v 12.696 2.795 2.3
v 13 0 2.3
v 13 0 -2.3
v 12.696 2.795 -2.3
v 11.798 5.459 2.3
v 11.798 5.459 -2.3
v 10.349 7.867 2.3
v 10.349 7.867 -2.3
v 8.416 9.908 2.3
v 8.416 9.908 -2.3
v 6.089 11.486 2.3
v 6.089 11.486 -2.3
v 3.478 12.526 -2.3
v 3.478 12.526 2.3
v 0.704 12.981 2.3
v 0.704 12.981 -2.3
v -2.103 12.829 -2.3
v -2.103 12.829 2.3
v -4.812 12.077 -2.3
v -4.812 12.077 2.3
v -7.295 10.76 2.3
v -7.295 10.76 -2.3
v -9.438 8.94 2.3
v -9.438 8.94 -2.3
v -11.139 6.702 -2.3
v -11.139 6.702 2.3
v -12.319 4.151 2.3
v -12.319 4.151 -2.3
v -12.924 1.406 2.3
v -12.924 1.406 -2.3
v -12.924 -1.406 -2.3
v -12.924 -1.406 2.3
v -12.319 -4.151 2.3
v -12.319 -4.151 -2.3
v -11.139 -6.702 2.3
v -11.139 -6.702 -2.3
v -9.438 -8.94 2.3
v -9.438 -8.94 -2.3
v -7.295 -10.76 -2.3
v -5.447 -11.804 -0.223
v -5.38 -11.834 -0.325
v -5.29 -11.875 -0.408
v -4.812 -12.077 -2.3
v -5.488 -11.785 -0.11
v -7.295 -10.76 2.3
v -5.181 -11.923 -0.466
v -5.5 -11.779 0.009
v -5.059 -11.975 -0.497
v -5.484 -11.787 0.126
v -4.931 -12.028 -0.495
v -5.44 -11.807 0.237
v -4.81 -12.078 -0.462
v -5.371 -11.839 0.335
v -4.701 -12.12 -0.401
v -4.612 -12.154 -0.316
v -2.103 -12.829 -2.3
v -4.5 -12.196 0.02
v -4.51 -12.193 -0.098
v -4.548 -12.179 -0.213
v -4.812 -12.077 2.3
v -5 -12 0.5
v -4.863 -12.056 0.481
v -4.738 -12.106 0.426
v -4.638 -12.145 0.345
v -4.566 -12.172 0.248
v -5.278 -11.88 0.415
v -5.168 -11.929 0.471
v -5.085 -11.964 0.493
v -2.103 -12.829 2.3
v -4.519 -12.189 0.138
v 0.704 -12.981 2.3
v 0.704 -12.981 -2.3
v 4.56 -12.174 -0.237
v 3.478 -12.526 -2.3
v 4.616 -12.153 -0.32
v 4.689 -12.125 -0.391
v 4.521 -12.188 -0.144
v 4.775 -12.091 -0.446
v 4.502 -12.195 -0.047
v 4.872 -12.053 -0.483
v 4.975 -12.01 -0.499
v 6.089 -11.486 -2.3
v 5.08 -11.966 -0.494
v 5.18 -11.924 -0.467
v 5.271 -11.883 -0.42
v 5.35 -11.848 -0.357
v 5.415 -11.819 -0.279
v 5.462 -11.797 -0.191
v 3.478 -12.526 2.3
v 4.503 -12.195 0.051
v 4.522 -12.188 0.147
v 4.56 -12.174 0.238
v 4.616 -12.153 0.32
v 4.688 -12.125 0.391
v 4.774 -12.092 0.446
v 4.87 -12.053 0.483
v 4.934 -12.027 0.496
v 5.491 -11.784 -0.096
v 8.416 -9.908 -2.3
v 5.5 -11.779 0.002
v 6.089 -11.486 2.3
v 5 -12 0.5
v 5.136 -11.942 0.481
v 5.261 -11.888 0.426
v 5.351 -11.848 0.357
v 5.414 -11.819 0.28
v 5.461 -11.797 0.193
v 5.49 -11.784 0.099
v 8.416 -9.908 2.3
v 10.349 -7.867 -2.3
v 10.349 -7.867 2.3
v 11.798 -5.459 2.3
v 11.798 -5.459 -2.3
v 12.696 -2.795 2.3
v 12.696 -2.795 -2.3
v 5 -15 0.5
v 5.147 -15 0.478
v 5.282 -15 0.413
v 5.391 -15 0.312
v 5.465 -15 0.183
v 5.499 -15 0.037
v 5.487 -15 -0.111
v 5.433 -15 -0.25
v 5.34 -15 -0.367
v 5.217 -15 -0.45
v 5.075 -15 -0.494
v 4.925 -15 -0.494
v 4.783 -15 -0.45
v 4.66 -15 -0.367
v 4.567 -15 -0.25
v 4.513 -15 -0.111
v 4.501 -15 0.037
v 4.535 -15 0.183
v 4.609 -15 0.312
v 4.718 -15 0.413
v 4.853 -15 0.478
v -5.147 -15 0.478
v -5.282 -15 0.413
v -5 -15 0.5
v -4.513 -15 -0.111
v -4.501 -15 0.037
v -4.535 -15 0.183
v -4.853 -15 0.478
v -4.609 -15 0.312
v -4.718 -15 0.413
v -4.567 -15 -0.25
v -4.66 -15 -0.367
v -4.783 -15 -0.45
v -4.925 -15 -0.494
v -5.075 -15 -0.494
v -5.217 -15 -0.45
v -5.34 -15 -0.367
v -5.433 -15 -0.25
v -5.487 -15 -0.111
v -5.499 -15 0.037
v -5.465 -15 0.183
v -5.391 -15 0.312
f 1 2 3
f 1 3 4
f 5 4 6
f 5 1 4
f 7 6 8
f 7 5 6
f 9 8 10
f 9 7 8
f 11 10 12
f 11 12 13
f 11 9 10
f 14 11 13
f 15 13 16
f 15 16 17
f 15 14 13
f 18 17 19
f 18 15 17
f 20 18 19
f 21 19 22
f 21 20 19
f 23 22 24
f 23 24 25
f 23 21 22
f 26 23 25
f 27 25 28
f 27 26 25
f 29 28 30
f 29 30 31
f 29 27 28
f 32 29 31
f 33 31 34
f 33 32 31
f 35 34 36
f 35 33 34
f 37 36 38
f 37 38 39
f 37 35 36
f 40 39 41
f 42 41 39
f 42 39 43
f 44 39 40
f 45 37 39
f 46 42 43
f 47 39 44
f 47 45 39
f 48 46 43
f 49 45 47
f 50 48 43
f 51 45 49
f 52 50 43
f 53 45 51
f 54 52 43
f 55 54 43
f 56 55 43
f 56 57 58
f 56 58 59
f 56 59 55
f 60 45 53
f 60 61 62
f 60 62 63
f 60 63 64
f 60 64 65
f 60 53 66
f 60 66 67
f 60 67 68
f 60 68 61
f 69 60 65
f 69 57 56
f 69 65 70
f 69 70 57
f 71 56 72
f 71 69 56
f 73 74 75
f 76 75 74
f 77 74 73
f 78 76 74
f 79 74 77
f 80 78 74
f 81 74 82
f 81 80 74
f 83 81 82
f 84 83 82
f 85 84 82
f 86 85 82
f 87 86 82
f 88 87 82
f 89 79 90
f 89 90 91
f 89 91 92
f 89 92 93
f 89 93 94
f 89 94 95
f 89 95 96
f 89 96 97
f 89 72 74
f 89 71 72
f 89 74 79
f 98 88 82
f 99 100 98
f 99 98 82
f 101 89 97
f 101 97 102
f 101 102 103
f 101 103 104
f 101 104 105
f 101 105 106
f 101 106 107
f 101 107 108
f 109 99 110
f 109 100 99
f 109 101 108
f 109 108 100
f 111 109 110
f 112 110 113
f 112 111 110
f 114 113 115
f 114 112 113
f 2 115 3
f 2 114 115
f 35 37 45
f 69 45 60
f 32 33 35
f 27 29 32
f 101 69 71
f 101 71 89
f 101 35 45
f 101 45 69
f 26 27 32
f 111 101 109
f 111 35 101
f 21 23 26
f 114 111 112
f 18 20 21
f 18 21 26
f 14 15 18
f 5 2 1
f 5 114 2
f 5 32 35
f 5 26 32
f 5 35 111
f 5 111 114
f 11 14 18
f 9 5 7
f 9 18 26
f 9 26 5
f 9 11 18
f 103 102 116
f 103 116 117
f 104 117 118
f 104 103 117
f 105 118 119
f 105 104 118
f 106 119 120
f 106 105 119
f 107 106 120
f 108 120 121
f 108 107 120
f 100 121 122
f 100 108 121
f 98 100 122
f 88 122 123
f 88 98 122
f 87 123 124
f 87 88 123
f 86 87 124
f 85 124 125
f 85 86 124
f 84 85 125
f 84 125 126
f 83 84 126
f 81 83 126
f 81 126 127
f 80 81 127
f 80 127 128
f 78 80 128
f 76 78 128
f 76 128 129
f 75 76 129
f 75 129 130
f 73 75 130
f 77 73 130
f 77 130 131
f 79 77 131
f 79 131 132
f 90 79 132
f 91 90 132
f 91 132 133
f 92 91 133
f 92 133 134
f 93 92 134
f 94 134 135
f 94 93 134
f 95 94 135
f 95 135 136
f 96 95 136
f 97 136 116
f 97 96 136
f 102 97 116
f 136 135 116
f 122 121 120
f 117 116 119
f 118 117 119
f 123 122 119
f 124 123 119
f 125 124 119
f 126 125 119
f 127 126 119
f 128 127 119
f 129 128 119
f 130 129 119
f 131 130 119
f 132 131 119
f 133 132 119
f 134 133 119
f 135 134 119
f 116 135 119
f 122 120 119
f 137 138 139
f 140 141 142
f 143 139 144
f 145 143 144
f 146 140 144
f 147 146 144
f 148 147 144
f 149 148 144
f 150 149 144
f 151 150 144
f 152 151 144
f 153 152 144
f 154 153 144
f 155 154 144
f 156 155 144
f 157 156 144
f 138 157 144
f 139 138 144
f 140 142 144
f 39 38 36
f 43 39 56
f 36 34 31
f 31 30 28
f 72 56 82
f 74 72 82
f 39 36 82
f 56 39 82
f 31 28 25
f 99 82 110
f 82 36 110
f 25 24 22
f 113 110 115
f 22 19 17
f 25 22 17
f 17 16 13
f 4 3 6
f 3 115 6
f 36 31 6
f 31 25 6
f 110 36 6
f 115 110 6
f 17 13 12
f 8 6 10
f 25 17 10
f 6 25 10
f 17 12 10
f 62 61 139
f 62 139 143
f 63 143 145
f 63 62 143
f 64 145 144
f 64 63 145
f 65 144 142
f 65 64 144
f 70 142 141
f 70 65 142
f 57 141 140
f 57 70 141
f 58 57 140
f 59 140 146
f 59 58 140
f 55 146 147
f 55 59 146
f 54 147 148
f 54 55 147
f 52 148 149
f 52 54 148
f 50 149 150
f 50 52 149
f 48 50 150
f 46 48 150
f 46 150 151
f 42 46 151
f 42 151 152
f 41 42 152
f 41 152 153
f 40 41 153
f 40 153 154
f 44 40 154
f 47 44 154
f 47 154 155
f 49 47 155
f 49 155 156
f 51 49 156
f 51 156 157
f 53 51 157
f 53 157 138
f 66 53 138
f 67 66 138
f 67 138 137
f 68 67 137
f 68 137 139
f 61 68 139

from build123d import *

# Parameters (mm, degrees)
SKETCH1_R           = 13
BOSS_EXTRUDE1_DEPTH = 2.3
SKETCH2_R           = 0.5
BOSS_EXTRUDE2_DEPTH = 15


with BuildPart() as part:
    # Sketch1 → Boss-Extrude1 (new, symmetric)
    with BuildSketch(Plane.XY):
        Circle(SKETCH1_R)
    extrude(amount=BOSS_EXTRUDE1_DEPTH, both=True)

    # Sketch2 → Boss-Extrude2 (add)
    with BuildSketch(Plane(origin=(0, 0, 0), x_dir=(1, 0, 0), z_dir=(0, 1, 0))):
        with Locations(Location((-5, 0, 0), (0, 0, 270))):
            Circle(SKETCH2_R)
        with Locations(Location((5, 0, 0), (0, 0, 270))):
            Circle(SKETCH2_R)
    extrude(amount=-BOSS_EXTRUDE2_DEPTH)


solid = part.part
